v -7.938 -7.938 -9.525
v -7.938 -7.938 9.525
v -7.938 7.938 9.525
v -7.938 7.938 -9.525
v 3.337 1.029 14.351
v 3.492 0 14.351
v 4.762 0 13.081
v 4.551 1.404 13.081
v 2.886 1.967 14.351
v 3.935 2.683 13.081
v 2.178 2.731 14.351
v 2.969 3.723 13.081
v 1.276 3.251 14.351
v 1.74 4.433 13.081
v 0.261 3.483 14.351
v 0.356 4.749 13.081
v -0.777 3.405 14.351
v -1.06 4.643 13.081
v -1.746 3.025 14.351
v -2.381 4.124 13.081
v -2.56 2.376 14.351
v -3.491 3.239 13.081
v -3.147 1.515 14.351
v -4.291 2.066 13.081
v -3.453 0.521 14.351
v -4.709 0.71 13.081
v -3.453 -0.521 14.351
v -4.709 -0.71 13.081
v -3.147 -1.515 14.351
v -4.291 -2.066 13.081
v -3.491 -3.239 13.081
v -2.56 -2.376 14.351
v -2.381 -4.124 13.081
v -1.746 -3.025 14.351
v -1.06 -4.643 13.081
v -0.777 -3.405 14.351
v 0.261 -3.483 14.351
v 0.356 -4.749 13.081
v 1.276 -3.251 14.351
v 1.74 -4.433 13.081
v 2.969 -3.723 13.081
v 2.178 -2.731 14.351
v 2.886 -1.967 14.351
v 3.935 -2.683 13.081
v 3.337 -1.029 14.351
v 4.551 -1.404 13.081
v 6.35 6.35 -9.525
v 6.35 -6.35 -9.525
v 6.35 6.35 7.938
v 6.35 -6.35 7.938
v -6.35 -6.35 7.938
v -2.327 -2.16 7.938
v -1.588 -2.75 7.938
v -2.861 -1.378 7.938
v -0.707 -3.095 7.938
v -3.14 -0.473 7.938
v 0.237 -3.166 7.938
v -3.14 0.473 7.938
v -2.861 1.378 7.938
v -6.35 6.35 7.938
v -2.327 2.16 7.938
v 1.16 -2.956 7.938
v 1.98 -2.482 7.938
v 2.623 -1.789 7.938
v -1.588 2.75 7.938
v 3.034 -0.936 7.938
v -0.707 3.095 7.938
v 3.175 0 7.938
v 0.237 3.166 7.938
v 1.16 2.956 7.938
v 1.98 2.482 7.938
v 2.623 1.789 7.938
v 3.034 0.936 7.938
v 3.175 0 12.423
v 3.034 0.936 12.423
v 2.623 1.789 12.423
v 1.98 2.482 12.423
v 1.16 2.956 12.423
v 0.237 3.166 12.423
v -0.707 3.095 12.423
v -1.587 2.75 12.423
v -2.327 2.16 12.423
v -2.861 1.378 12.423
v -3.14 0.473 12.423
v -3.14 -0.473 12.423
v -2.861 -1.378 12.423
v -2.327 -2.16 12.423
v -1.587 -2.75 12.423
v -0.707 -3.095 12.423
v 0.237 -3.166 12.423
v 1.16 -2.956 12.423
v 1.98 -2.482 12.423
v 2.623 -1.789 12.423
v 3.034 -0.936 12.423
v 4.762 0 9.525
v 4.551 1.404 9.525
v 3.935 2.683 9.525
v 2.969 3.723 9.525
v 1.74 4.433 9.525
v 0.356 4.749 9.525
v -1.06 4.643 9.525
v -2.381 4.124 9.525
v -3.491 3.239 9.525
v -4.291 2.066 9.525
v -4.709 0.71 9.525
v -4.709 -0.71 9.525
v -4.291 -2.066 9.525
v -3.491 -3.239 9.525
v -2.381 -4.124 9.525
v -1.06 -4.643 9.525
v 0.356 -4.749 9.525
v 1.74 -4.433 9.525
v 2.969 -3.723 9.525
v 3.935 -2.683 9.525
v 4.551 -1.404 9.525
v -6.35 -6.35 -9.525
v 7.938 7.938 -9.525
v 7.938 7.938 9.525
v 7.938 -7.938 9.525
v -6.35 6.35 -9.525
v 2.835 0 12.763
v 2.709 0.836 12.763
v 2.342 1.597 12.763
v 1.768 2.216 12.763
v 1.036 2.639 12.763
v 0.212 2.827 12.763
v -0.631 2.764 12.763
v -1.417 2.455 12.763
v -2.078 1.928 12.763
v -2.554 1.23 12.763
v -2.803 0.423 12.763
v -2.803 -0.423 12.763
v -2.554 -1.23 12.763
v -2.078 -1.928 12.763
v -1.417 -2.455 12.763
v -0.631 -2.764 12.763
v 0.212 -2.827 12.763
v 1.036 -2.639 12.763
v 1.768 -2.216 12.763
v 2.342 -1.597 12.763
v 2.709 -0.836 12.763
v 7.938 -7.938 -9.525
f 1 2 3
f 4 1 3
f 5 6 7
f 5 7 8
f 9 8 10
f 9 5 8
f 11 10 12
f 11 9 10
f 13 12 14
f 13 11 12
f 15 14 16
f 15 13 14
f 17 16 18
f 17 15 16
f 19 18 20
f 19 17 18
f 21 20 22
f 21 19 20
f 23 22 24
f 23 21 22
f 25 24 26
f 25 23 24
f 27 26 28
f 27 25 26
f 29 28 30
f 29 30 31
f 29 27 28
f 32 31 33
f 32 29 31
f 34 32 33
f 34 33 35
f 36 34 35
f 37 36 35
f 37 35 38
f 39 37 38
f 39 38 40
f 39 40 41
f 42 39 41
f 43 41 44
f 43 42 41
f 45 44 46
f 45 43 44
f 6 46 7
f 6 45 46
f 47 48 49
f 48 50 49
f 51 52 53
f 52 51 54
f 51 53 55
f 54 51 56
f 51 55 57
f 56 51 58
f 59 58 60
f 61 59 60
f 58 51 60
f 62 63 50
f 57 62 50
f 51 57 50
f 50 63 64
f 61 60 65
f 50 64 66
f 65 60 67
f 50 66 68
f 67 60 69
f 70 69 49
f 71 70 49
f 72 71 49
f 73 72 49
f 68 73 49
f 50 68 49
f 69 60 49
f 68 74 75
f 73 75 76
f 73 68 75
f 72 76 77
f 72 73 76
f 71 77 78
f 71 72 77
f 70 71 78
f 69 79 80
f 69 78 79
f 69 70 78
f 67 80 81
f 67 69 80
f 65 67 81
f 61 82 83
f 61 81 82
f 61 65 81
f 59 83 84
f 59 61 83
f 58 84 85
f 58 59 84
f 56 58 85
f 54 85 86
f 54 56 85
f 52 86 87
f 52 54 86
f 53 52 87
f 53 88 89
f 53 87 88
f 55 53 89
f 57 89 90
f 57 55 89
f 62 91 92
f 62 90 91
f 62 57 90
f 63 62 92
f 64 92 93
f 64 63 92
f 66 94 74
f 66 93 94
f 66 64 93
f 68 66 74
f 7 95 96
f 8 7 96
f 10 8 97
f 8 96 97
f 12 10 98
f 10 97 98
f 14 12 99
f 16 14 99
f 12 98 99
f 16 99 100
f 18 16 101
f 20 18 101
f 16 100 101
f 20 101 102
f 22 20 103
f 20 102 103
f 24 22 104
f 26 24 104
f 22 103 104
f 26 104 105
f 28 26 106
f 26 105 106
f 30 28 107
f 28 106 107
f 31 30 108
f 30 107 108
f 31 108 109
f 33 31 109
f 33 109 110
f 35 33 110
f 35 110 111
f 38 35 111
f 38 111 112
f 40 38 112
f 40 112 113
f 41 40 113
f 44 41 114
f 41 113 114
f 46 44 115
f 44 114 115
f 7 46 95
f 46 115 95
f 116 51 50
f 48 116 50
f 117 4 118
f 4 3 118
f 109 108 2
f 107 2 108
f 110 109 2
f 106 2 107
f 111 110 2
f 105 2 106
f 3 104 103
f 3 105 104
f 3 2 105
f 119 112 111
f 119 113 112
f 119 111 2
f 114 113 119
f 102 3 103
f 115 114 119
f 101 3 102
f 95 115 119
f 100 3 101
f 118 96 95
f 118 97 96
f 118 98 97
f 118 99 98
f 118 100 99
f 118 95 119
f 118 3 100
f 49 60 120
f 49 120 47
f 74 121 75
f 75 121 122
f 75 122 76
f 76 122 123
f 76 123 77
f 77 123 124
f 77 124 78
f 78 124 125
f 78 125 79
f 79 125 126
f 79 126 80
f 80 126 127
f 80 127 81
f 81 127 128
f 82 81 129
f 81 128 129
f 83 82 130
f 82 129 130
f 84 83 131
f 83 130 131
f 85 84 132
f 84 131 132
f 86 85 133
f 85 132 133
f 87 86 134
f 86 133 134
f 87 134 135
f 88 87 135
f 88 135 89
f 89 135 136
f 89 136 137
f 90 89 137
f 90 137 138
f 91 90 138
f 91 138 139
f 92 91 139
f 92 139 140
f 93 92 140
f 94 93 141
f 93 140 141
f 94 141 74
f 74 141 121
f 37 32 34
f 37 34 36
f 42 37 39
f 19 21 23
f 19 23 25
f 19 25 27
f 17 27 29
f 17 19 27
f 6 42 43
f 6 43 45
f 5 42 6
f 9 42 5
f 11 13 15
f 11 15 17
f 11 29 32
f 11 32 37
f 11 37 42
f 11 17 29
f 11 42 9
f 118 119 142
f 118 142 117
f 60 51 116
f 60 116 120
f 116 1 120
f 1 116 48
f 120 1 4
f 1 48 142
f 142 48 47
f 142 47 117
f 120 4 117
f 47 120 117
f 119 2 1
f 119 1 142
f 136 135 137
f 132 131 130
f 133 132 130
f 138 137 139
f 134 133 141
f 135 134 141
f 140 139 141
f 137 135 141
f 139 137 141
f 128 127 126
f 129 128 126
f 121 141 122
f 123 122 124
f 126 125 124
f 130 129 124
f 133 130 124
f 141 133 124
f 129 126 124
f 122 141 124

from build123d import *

# Parameters (mm, degrees)
F0_W     = 15.875
F0_H     = 15.875
F1_DEPTH = 9.525
F2_R     = 4.7625
F3_DEPTH = 4.826
F4_SIZE  = 1.27
F5_T     = -1.5875


with BuildPart() as f1:
    # F0 (on Top) → F1 (new body, symmetric)
    with BuildSketch(Plane.XY):
        Rectangle(F0_W, F0_H)
    extrude(amount=F1_DEPTH, both=True)

    # F2 (on face) → F3 (join)
    with BuildSketch(Plane.XY.offset(9.525)):
        Circle(F2_R)
    extrude(amount=F3_DEPTH)

    # F4
    f4_edges = [f1.edges().sort_by_distance(p)[0] for p in [
        (-4.7625, 0, 14.351),
    ]]
    chamfer(f4_edges, length=F4_SIZE)

    # F5
    f5_openings = [f1.faces().sort_by_distance(p)[0] for p in [
        (0, 0, -9.525),
    ]]
    offset(amount=F5_T, openings=f5_openings, kind=Kind.INTERSECTION)


solid = f1.part
